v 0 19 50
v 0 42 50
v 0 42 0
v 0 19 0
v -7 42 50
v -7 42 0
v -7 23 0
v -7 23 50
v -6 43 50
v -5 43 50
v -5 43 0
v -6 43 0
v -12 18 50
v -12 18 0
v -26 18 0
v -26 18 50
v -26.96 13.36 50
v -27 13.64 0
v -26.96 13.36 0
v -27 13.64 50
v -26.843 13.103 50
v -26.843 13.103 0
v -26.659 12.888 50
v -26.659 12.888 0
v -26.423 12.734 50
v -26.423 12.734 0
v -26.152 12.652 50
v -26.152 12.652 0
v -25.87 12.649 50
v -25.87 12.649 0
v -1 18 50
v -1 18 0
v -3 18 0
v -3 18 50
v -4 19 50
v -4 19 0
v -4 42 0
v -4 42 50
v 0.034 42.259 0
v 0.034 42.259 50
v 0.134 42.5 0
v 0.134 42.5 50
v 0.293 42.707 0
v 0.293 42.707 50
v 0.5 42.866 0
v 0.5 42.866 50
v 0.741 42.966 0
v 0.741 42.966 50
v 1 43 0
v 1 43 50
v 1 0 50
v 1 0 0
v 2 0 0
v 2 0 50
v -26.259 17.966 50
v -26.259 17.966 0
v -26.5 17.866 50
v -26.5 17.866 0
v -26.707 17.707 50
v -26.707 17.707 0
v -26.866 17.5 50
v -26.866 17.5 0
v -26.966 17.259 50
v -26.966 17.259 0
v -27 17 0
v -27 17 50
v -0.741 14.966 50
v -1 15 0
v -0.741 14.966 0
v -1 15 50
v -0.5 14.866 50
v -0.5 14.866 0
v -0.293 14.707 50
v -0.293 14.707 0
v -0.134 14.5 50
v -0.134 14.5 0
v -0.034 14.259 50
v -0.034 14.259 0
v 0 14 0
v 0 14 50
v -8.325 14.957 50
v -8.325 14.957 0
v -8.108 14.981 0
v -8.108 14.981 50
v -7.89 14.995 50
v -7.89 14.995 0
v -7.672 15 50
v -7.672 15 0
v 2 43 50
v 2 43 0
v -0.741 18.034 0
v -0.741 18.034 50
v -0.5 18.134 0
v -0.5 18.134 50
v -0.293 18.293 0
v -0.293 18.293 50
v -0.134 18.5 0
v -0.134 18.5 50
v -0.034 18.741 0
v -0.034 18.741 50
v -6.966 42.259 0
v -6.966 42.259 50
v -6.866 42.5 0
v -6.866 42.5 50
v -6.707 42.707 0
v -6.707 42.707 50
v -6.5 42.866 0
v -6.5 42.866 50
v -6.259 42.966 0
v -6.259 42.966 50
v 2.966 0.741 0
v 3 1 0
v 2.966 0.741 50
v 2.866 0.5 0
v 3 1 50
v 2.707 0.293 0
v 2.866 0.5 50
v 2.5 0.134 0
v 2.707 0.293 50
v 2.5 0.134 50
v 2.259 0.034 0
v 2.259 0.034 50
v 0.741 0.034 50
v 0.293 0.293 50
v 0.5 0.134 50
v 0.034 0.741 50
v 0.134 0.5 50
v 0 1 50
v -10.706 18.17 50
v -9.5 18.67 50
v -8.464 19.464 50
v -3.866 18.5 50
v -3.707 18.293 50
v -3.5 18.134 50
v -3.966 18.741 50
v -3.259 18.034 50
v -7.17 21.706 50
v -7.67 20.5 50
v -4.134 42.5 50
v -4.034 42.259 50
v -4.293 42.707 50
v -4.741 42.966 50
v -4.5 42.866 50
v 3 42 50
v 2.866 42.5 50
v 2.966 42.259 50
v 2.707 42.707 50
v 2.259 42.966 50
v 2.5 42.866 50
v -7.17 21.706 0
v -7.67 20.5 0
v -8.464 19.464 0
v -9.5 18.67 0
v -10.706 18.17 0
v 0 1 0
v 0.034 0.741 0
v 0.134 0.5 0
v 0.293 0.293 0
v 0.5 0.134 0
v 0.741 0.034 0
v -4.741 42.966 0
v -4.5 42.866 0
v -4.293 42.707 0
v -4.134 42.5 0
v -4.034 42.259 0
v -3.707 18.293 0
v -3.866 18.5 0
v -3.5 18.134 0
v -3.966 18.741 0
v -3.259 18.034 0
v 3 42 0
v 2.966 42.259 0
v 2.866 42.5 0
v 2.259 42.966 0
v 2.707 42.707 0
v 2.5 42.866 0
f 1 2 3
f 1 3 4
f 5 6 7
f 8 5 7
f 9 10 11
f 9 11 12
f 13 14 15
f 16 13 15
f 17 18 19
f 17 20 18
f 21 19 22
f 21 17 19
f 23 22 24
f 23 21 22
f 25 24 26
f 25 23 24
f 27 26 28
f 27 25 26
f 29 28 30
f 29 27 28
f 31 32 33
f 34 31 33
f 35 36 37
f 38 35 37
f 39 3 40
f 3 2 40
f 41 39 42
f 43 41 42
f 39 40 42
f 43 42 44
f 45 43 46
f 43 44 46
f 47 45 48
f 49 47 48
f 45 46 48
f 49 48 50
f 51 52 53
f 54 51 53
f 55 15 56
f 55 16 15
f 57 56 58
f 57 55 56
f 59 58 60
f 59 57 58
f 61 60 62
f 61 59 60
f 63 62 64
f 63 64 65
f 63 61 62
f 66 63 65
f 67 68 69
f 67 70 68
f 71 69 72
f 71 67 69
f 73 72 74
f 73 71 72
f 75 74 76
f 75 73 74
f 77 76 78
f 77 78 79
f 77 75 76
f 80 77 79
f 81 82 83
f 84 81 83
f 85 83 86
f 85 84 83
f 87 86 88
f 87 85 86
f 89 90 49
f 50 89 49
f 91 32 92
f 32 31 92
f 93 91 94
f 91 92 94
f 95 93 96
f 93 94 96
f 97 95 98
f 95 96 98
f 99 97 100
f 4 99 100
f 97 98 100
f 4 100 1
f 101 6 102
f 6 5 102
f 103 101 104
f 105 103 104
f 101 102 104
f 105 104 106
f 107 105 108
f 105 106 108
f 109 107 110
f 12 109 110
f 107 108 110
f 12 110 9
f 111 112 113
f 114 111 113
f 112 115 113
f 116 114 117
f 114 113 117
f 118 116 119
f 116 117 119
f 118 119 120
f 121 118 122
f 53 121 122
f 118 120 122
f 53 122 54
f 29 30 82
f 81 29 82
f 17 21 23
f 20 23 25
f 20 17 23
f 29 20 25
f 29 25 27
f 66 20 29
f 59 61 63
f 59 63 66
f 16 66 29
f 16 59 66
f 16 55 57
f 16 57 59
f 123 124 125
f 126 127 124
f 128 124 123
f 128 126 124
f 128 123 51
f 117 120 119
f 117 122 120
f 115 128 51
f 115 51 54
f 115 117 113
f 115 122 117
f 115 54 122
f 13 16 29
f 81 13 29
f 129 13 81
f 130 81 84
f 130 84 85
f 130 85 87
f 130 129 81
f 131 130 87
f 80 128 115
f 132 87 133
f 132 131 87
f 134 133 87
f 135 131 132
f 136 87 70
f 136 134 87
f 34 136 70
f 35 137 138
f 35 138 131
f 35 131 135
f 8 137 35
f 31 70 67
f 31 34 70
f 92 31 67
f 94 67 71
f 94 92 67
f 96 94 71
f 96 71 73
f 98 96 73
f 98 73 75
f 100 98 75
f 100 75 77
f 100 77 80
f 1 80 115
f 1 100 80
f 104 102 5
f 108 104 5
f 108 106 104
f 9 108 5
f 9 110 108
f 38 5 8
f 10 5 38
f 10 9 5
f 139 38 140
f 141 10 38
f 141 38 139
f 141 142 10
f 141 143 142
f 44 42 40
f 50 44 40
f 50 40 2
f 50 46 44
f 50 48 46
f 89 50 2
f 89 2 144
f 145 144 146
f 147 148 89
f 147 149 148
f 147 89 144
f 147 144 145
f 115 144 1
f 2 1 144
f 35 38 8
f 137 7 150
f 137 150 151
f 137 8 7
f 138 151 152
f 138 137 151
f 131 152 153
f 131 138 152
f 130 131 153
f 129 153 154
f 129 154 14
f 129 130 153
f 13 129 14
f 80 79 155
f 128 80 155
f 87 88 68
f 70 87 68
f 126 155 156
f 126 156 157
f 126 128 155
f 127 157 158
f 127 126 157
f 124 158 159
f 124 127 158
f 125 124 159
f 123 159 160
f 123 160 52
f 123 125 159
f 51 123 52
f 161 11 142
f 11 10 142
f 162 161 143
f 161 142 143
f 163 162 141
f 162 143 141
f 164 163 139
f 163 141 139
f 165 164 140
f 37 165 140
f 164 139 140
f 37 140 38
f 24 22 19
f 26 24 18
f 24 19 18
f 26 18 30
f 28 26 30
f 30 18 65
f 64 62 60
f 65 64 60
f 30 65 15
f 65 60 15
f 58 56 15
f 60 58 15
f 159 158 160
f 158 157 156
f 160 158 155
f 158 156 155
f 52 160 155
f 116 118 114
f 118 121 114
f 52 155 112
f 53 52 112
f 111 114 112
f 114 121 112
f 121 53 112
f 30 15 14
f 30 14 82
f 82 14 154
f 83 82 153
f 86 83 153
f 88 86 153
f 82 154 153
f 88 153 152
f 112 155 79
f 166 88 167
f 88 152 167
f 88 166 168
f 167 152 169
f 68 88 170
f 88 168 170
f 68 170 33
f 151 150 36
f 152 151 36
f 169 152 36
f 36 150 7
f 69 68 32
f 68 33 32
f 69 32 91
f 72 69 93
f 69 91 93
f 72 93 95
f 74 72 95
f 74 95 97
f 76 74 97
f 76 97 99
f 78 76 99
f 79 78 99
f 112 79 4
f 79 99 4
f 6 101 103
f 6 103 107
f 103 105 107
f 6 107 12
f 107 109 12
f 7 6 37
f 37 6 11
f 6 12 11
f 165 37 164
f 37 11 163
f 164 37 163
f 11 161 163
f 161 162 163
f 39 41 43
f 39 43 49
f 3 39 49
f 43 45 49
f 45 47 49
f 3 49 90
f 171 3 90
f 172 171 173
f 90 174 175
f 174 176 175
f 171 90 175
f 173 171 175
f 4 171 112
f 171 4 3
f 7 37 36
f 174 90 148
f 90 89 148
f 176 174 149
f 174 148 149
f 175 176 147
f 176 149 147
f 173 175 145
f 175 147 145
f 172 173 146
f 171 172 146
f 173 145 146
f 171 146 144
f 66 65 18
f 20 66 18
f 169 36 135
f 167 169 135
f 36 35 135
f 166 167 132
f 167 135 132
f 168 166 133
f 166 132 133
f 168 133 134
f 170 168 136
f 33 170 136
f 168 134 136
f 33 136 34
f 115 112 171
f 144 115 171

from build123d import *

# Parameters (mm, degrees)
F1_DEPTH = 50
F2_R     = 5
F3_R     = 1


with BuildPart() as f1:
    # F0 (on Top) → F1 (new body)
    with BuildSketch(Plane.XY):
        Polygon((0, 15), (0, 0), (3, 0), (3, 43), (0, 43), (0, 18), (-4, 18), (-4, 43), (-7, 43), (-7, 18), (-27, 18), (-27, 15), (-8, 15), align=None)
        Polygon((-27, 12.5), (-8, 15), (-27, 15), align=None)
    extrude(amount=F1_DEPTH)

    # F2
    f2_edges = [f1.edges().sort_by_distance(p)[0] for p in [
        (-8, 15, 25),
        (-7, 18, 25),
    ]]
    fillet(f2_edges, radius=F2_R)

    # F3
    f3_edges = [f1.edges().sort_by_distance(p)[0] for p in [
        (-7, 43, 25),
        (-4, 43, 25),
        (0, 43, 25),
        (3, 43, 25),
        (0, 0, 25),
        (3, 0, 25),
        (0, 15, 25),
        (-4, 18, 25),
        (0, 18, 25),
        (-27, 12.5, 25),
        (-27, 18, 25),
    ]]
    fillet(f3_edges, radius=F3_R)


solid = f1.part
